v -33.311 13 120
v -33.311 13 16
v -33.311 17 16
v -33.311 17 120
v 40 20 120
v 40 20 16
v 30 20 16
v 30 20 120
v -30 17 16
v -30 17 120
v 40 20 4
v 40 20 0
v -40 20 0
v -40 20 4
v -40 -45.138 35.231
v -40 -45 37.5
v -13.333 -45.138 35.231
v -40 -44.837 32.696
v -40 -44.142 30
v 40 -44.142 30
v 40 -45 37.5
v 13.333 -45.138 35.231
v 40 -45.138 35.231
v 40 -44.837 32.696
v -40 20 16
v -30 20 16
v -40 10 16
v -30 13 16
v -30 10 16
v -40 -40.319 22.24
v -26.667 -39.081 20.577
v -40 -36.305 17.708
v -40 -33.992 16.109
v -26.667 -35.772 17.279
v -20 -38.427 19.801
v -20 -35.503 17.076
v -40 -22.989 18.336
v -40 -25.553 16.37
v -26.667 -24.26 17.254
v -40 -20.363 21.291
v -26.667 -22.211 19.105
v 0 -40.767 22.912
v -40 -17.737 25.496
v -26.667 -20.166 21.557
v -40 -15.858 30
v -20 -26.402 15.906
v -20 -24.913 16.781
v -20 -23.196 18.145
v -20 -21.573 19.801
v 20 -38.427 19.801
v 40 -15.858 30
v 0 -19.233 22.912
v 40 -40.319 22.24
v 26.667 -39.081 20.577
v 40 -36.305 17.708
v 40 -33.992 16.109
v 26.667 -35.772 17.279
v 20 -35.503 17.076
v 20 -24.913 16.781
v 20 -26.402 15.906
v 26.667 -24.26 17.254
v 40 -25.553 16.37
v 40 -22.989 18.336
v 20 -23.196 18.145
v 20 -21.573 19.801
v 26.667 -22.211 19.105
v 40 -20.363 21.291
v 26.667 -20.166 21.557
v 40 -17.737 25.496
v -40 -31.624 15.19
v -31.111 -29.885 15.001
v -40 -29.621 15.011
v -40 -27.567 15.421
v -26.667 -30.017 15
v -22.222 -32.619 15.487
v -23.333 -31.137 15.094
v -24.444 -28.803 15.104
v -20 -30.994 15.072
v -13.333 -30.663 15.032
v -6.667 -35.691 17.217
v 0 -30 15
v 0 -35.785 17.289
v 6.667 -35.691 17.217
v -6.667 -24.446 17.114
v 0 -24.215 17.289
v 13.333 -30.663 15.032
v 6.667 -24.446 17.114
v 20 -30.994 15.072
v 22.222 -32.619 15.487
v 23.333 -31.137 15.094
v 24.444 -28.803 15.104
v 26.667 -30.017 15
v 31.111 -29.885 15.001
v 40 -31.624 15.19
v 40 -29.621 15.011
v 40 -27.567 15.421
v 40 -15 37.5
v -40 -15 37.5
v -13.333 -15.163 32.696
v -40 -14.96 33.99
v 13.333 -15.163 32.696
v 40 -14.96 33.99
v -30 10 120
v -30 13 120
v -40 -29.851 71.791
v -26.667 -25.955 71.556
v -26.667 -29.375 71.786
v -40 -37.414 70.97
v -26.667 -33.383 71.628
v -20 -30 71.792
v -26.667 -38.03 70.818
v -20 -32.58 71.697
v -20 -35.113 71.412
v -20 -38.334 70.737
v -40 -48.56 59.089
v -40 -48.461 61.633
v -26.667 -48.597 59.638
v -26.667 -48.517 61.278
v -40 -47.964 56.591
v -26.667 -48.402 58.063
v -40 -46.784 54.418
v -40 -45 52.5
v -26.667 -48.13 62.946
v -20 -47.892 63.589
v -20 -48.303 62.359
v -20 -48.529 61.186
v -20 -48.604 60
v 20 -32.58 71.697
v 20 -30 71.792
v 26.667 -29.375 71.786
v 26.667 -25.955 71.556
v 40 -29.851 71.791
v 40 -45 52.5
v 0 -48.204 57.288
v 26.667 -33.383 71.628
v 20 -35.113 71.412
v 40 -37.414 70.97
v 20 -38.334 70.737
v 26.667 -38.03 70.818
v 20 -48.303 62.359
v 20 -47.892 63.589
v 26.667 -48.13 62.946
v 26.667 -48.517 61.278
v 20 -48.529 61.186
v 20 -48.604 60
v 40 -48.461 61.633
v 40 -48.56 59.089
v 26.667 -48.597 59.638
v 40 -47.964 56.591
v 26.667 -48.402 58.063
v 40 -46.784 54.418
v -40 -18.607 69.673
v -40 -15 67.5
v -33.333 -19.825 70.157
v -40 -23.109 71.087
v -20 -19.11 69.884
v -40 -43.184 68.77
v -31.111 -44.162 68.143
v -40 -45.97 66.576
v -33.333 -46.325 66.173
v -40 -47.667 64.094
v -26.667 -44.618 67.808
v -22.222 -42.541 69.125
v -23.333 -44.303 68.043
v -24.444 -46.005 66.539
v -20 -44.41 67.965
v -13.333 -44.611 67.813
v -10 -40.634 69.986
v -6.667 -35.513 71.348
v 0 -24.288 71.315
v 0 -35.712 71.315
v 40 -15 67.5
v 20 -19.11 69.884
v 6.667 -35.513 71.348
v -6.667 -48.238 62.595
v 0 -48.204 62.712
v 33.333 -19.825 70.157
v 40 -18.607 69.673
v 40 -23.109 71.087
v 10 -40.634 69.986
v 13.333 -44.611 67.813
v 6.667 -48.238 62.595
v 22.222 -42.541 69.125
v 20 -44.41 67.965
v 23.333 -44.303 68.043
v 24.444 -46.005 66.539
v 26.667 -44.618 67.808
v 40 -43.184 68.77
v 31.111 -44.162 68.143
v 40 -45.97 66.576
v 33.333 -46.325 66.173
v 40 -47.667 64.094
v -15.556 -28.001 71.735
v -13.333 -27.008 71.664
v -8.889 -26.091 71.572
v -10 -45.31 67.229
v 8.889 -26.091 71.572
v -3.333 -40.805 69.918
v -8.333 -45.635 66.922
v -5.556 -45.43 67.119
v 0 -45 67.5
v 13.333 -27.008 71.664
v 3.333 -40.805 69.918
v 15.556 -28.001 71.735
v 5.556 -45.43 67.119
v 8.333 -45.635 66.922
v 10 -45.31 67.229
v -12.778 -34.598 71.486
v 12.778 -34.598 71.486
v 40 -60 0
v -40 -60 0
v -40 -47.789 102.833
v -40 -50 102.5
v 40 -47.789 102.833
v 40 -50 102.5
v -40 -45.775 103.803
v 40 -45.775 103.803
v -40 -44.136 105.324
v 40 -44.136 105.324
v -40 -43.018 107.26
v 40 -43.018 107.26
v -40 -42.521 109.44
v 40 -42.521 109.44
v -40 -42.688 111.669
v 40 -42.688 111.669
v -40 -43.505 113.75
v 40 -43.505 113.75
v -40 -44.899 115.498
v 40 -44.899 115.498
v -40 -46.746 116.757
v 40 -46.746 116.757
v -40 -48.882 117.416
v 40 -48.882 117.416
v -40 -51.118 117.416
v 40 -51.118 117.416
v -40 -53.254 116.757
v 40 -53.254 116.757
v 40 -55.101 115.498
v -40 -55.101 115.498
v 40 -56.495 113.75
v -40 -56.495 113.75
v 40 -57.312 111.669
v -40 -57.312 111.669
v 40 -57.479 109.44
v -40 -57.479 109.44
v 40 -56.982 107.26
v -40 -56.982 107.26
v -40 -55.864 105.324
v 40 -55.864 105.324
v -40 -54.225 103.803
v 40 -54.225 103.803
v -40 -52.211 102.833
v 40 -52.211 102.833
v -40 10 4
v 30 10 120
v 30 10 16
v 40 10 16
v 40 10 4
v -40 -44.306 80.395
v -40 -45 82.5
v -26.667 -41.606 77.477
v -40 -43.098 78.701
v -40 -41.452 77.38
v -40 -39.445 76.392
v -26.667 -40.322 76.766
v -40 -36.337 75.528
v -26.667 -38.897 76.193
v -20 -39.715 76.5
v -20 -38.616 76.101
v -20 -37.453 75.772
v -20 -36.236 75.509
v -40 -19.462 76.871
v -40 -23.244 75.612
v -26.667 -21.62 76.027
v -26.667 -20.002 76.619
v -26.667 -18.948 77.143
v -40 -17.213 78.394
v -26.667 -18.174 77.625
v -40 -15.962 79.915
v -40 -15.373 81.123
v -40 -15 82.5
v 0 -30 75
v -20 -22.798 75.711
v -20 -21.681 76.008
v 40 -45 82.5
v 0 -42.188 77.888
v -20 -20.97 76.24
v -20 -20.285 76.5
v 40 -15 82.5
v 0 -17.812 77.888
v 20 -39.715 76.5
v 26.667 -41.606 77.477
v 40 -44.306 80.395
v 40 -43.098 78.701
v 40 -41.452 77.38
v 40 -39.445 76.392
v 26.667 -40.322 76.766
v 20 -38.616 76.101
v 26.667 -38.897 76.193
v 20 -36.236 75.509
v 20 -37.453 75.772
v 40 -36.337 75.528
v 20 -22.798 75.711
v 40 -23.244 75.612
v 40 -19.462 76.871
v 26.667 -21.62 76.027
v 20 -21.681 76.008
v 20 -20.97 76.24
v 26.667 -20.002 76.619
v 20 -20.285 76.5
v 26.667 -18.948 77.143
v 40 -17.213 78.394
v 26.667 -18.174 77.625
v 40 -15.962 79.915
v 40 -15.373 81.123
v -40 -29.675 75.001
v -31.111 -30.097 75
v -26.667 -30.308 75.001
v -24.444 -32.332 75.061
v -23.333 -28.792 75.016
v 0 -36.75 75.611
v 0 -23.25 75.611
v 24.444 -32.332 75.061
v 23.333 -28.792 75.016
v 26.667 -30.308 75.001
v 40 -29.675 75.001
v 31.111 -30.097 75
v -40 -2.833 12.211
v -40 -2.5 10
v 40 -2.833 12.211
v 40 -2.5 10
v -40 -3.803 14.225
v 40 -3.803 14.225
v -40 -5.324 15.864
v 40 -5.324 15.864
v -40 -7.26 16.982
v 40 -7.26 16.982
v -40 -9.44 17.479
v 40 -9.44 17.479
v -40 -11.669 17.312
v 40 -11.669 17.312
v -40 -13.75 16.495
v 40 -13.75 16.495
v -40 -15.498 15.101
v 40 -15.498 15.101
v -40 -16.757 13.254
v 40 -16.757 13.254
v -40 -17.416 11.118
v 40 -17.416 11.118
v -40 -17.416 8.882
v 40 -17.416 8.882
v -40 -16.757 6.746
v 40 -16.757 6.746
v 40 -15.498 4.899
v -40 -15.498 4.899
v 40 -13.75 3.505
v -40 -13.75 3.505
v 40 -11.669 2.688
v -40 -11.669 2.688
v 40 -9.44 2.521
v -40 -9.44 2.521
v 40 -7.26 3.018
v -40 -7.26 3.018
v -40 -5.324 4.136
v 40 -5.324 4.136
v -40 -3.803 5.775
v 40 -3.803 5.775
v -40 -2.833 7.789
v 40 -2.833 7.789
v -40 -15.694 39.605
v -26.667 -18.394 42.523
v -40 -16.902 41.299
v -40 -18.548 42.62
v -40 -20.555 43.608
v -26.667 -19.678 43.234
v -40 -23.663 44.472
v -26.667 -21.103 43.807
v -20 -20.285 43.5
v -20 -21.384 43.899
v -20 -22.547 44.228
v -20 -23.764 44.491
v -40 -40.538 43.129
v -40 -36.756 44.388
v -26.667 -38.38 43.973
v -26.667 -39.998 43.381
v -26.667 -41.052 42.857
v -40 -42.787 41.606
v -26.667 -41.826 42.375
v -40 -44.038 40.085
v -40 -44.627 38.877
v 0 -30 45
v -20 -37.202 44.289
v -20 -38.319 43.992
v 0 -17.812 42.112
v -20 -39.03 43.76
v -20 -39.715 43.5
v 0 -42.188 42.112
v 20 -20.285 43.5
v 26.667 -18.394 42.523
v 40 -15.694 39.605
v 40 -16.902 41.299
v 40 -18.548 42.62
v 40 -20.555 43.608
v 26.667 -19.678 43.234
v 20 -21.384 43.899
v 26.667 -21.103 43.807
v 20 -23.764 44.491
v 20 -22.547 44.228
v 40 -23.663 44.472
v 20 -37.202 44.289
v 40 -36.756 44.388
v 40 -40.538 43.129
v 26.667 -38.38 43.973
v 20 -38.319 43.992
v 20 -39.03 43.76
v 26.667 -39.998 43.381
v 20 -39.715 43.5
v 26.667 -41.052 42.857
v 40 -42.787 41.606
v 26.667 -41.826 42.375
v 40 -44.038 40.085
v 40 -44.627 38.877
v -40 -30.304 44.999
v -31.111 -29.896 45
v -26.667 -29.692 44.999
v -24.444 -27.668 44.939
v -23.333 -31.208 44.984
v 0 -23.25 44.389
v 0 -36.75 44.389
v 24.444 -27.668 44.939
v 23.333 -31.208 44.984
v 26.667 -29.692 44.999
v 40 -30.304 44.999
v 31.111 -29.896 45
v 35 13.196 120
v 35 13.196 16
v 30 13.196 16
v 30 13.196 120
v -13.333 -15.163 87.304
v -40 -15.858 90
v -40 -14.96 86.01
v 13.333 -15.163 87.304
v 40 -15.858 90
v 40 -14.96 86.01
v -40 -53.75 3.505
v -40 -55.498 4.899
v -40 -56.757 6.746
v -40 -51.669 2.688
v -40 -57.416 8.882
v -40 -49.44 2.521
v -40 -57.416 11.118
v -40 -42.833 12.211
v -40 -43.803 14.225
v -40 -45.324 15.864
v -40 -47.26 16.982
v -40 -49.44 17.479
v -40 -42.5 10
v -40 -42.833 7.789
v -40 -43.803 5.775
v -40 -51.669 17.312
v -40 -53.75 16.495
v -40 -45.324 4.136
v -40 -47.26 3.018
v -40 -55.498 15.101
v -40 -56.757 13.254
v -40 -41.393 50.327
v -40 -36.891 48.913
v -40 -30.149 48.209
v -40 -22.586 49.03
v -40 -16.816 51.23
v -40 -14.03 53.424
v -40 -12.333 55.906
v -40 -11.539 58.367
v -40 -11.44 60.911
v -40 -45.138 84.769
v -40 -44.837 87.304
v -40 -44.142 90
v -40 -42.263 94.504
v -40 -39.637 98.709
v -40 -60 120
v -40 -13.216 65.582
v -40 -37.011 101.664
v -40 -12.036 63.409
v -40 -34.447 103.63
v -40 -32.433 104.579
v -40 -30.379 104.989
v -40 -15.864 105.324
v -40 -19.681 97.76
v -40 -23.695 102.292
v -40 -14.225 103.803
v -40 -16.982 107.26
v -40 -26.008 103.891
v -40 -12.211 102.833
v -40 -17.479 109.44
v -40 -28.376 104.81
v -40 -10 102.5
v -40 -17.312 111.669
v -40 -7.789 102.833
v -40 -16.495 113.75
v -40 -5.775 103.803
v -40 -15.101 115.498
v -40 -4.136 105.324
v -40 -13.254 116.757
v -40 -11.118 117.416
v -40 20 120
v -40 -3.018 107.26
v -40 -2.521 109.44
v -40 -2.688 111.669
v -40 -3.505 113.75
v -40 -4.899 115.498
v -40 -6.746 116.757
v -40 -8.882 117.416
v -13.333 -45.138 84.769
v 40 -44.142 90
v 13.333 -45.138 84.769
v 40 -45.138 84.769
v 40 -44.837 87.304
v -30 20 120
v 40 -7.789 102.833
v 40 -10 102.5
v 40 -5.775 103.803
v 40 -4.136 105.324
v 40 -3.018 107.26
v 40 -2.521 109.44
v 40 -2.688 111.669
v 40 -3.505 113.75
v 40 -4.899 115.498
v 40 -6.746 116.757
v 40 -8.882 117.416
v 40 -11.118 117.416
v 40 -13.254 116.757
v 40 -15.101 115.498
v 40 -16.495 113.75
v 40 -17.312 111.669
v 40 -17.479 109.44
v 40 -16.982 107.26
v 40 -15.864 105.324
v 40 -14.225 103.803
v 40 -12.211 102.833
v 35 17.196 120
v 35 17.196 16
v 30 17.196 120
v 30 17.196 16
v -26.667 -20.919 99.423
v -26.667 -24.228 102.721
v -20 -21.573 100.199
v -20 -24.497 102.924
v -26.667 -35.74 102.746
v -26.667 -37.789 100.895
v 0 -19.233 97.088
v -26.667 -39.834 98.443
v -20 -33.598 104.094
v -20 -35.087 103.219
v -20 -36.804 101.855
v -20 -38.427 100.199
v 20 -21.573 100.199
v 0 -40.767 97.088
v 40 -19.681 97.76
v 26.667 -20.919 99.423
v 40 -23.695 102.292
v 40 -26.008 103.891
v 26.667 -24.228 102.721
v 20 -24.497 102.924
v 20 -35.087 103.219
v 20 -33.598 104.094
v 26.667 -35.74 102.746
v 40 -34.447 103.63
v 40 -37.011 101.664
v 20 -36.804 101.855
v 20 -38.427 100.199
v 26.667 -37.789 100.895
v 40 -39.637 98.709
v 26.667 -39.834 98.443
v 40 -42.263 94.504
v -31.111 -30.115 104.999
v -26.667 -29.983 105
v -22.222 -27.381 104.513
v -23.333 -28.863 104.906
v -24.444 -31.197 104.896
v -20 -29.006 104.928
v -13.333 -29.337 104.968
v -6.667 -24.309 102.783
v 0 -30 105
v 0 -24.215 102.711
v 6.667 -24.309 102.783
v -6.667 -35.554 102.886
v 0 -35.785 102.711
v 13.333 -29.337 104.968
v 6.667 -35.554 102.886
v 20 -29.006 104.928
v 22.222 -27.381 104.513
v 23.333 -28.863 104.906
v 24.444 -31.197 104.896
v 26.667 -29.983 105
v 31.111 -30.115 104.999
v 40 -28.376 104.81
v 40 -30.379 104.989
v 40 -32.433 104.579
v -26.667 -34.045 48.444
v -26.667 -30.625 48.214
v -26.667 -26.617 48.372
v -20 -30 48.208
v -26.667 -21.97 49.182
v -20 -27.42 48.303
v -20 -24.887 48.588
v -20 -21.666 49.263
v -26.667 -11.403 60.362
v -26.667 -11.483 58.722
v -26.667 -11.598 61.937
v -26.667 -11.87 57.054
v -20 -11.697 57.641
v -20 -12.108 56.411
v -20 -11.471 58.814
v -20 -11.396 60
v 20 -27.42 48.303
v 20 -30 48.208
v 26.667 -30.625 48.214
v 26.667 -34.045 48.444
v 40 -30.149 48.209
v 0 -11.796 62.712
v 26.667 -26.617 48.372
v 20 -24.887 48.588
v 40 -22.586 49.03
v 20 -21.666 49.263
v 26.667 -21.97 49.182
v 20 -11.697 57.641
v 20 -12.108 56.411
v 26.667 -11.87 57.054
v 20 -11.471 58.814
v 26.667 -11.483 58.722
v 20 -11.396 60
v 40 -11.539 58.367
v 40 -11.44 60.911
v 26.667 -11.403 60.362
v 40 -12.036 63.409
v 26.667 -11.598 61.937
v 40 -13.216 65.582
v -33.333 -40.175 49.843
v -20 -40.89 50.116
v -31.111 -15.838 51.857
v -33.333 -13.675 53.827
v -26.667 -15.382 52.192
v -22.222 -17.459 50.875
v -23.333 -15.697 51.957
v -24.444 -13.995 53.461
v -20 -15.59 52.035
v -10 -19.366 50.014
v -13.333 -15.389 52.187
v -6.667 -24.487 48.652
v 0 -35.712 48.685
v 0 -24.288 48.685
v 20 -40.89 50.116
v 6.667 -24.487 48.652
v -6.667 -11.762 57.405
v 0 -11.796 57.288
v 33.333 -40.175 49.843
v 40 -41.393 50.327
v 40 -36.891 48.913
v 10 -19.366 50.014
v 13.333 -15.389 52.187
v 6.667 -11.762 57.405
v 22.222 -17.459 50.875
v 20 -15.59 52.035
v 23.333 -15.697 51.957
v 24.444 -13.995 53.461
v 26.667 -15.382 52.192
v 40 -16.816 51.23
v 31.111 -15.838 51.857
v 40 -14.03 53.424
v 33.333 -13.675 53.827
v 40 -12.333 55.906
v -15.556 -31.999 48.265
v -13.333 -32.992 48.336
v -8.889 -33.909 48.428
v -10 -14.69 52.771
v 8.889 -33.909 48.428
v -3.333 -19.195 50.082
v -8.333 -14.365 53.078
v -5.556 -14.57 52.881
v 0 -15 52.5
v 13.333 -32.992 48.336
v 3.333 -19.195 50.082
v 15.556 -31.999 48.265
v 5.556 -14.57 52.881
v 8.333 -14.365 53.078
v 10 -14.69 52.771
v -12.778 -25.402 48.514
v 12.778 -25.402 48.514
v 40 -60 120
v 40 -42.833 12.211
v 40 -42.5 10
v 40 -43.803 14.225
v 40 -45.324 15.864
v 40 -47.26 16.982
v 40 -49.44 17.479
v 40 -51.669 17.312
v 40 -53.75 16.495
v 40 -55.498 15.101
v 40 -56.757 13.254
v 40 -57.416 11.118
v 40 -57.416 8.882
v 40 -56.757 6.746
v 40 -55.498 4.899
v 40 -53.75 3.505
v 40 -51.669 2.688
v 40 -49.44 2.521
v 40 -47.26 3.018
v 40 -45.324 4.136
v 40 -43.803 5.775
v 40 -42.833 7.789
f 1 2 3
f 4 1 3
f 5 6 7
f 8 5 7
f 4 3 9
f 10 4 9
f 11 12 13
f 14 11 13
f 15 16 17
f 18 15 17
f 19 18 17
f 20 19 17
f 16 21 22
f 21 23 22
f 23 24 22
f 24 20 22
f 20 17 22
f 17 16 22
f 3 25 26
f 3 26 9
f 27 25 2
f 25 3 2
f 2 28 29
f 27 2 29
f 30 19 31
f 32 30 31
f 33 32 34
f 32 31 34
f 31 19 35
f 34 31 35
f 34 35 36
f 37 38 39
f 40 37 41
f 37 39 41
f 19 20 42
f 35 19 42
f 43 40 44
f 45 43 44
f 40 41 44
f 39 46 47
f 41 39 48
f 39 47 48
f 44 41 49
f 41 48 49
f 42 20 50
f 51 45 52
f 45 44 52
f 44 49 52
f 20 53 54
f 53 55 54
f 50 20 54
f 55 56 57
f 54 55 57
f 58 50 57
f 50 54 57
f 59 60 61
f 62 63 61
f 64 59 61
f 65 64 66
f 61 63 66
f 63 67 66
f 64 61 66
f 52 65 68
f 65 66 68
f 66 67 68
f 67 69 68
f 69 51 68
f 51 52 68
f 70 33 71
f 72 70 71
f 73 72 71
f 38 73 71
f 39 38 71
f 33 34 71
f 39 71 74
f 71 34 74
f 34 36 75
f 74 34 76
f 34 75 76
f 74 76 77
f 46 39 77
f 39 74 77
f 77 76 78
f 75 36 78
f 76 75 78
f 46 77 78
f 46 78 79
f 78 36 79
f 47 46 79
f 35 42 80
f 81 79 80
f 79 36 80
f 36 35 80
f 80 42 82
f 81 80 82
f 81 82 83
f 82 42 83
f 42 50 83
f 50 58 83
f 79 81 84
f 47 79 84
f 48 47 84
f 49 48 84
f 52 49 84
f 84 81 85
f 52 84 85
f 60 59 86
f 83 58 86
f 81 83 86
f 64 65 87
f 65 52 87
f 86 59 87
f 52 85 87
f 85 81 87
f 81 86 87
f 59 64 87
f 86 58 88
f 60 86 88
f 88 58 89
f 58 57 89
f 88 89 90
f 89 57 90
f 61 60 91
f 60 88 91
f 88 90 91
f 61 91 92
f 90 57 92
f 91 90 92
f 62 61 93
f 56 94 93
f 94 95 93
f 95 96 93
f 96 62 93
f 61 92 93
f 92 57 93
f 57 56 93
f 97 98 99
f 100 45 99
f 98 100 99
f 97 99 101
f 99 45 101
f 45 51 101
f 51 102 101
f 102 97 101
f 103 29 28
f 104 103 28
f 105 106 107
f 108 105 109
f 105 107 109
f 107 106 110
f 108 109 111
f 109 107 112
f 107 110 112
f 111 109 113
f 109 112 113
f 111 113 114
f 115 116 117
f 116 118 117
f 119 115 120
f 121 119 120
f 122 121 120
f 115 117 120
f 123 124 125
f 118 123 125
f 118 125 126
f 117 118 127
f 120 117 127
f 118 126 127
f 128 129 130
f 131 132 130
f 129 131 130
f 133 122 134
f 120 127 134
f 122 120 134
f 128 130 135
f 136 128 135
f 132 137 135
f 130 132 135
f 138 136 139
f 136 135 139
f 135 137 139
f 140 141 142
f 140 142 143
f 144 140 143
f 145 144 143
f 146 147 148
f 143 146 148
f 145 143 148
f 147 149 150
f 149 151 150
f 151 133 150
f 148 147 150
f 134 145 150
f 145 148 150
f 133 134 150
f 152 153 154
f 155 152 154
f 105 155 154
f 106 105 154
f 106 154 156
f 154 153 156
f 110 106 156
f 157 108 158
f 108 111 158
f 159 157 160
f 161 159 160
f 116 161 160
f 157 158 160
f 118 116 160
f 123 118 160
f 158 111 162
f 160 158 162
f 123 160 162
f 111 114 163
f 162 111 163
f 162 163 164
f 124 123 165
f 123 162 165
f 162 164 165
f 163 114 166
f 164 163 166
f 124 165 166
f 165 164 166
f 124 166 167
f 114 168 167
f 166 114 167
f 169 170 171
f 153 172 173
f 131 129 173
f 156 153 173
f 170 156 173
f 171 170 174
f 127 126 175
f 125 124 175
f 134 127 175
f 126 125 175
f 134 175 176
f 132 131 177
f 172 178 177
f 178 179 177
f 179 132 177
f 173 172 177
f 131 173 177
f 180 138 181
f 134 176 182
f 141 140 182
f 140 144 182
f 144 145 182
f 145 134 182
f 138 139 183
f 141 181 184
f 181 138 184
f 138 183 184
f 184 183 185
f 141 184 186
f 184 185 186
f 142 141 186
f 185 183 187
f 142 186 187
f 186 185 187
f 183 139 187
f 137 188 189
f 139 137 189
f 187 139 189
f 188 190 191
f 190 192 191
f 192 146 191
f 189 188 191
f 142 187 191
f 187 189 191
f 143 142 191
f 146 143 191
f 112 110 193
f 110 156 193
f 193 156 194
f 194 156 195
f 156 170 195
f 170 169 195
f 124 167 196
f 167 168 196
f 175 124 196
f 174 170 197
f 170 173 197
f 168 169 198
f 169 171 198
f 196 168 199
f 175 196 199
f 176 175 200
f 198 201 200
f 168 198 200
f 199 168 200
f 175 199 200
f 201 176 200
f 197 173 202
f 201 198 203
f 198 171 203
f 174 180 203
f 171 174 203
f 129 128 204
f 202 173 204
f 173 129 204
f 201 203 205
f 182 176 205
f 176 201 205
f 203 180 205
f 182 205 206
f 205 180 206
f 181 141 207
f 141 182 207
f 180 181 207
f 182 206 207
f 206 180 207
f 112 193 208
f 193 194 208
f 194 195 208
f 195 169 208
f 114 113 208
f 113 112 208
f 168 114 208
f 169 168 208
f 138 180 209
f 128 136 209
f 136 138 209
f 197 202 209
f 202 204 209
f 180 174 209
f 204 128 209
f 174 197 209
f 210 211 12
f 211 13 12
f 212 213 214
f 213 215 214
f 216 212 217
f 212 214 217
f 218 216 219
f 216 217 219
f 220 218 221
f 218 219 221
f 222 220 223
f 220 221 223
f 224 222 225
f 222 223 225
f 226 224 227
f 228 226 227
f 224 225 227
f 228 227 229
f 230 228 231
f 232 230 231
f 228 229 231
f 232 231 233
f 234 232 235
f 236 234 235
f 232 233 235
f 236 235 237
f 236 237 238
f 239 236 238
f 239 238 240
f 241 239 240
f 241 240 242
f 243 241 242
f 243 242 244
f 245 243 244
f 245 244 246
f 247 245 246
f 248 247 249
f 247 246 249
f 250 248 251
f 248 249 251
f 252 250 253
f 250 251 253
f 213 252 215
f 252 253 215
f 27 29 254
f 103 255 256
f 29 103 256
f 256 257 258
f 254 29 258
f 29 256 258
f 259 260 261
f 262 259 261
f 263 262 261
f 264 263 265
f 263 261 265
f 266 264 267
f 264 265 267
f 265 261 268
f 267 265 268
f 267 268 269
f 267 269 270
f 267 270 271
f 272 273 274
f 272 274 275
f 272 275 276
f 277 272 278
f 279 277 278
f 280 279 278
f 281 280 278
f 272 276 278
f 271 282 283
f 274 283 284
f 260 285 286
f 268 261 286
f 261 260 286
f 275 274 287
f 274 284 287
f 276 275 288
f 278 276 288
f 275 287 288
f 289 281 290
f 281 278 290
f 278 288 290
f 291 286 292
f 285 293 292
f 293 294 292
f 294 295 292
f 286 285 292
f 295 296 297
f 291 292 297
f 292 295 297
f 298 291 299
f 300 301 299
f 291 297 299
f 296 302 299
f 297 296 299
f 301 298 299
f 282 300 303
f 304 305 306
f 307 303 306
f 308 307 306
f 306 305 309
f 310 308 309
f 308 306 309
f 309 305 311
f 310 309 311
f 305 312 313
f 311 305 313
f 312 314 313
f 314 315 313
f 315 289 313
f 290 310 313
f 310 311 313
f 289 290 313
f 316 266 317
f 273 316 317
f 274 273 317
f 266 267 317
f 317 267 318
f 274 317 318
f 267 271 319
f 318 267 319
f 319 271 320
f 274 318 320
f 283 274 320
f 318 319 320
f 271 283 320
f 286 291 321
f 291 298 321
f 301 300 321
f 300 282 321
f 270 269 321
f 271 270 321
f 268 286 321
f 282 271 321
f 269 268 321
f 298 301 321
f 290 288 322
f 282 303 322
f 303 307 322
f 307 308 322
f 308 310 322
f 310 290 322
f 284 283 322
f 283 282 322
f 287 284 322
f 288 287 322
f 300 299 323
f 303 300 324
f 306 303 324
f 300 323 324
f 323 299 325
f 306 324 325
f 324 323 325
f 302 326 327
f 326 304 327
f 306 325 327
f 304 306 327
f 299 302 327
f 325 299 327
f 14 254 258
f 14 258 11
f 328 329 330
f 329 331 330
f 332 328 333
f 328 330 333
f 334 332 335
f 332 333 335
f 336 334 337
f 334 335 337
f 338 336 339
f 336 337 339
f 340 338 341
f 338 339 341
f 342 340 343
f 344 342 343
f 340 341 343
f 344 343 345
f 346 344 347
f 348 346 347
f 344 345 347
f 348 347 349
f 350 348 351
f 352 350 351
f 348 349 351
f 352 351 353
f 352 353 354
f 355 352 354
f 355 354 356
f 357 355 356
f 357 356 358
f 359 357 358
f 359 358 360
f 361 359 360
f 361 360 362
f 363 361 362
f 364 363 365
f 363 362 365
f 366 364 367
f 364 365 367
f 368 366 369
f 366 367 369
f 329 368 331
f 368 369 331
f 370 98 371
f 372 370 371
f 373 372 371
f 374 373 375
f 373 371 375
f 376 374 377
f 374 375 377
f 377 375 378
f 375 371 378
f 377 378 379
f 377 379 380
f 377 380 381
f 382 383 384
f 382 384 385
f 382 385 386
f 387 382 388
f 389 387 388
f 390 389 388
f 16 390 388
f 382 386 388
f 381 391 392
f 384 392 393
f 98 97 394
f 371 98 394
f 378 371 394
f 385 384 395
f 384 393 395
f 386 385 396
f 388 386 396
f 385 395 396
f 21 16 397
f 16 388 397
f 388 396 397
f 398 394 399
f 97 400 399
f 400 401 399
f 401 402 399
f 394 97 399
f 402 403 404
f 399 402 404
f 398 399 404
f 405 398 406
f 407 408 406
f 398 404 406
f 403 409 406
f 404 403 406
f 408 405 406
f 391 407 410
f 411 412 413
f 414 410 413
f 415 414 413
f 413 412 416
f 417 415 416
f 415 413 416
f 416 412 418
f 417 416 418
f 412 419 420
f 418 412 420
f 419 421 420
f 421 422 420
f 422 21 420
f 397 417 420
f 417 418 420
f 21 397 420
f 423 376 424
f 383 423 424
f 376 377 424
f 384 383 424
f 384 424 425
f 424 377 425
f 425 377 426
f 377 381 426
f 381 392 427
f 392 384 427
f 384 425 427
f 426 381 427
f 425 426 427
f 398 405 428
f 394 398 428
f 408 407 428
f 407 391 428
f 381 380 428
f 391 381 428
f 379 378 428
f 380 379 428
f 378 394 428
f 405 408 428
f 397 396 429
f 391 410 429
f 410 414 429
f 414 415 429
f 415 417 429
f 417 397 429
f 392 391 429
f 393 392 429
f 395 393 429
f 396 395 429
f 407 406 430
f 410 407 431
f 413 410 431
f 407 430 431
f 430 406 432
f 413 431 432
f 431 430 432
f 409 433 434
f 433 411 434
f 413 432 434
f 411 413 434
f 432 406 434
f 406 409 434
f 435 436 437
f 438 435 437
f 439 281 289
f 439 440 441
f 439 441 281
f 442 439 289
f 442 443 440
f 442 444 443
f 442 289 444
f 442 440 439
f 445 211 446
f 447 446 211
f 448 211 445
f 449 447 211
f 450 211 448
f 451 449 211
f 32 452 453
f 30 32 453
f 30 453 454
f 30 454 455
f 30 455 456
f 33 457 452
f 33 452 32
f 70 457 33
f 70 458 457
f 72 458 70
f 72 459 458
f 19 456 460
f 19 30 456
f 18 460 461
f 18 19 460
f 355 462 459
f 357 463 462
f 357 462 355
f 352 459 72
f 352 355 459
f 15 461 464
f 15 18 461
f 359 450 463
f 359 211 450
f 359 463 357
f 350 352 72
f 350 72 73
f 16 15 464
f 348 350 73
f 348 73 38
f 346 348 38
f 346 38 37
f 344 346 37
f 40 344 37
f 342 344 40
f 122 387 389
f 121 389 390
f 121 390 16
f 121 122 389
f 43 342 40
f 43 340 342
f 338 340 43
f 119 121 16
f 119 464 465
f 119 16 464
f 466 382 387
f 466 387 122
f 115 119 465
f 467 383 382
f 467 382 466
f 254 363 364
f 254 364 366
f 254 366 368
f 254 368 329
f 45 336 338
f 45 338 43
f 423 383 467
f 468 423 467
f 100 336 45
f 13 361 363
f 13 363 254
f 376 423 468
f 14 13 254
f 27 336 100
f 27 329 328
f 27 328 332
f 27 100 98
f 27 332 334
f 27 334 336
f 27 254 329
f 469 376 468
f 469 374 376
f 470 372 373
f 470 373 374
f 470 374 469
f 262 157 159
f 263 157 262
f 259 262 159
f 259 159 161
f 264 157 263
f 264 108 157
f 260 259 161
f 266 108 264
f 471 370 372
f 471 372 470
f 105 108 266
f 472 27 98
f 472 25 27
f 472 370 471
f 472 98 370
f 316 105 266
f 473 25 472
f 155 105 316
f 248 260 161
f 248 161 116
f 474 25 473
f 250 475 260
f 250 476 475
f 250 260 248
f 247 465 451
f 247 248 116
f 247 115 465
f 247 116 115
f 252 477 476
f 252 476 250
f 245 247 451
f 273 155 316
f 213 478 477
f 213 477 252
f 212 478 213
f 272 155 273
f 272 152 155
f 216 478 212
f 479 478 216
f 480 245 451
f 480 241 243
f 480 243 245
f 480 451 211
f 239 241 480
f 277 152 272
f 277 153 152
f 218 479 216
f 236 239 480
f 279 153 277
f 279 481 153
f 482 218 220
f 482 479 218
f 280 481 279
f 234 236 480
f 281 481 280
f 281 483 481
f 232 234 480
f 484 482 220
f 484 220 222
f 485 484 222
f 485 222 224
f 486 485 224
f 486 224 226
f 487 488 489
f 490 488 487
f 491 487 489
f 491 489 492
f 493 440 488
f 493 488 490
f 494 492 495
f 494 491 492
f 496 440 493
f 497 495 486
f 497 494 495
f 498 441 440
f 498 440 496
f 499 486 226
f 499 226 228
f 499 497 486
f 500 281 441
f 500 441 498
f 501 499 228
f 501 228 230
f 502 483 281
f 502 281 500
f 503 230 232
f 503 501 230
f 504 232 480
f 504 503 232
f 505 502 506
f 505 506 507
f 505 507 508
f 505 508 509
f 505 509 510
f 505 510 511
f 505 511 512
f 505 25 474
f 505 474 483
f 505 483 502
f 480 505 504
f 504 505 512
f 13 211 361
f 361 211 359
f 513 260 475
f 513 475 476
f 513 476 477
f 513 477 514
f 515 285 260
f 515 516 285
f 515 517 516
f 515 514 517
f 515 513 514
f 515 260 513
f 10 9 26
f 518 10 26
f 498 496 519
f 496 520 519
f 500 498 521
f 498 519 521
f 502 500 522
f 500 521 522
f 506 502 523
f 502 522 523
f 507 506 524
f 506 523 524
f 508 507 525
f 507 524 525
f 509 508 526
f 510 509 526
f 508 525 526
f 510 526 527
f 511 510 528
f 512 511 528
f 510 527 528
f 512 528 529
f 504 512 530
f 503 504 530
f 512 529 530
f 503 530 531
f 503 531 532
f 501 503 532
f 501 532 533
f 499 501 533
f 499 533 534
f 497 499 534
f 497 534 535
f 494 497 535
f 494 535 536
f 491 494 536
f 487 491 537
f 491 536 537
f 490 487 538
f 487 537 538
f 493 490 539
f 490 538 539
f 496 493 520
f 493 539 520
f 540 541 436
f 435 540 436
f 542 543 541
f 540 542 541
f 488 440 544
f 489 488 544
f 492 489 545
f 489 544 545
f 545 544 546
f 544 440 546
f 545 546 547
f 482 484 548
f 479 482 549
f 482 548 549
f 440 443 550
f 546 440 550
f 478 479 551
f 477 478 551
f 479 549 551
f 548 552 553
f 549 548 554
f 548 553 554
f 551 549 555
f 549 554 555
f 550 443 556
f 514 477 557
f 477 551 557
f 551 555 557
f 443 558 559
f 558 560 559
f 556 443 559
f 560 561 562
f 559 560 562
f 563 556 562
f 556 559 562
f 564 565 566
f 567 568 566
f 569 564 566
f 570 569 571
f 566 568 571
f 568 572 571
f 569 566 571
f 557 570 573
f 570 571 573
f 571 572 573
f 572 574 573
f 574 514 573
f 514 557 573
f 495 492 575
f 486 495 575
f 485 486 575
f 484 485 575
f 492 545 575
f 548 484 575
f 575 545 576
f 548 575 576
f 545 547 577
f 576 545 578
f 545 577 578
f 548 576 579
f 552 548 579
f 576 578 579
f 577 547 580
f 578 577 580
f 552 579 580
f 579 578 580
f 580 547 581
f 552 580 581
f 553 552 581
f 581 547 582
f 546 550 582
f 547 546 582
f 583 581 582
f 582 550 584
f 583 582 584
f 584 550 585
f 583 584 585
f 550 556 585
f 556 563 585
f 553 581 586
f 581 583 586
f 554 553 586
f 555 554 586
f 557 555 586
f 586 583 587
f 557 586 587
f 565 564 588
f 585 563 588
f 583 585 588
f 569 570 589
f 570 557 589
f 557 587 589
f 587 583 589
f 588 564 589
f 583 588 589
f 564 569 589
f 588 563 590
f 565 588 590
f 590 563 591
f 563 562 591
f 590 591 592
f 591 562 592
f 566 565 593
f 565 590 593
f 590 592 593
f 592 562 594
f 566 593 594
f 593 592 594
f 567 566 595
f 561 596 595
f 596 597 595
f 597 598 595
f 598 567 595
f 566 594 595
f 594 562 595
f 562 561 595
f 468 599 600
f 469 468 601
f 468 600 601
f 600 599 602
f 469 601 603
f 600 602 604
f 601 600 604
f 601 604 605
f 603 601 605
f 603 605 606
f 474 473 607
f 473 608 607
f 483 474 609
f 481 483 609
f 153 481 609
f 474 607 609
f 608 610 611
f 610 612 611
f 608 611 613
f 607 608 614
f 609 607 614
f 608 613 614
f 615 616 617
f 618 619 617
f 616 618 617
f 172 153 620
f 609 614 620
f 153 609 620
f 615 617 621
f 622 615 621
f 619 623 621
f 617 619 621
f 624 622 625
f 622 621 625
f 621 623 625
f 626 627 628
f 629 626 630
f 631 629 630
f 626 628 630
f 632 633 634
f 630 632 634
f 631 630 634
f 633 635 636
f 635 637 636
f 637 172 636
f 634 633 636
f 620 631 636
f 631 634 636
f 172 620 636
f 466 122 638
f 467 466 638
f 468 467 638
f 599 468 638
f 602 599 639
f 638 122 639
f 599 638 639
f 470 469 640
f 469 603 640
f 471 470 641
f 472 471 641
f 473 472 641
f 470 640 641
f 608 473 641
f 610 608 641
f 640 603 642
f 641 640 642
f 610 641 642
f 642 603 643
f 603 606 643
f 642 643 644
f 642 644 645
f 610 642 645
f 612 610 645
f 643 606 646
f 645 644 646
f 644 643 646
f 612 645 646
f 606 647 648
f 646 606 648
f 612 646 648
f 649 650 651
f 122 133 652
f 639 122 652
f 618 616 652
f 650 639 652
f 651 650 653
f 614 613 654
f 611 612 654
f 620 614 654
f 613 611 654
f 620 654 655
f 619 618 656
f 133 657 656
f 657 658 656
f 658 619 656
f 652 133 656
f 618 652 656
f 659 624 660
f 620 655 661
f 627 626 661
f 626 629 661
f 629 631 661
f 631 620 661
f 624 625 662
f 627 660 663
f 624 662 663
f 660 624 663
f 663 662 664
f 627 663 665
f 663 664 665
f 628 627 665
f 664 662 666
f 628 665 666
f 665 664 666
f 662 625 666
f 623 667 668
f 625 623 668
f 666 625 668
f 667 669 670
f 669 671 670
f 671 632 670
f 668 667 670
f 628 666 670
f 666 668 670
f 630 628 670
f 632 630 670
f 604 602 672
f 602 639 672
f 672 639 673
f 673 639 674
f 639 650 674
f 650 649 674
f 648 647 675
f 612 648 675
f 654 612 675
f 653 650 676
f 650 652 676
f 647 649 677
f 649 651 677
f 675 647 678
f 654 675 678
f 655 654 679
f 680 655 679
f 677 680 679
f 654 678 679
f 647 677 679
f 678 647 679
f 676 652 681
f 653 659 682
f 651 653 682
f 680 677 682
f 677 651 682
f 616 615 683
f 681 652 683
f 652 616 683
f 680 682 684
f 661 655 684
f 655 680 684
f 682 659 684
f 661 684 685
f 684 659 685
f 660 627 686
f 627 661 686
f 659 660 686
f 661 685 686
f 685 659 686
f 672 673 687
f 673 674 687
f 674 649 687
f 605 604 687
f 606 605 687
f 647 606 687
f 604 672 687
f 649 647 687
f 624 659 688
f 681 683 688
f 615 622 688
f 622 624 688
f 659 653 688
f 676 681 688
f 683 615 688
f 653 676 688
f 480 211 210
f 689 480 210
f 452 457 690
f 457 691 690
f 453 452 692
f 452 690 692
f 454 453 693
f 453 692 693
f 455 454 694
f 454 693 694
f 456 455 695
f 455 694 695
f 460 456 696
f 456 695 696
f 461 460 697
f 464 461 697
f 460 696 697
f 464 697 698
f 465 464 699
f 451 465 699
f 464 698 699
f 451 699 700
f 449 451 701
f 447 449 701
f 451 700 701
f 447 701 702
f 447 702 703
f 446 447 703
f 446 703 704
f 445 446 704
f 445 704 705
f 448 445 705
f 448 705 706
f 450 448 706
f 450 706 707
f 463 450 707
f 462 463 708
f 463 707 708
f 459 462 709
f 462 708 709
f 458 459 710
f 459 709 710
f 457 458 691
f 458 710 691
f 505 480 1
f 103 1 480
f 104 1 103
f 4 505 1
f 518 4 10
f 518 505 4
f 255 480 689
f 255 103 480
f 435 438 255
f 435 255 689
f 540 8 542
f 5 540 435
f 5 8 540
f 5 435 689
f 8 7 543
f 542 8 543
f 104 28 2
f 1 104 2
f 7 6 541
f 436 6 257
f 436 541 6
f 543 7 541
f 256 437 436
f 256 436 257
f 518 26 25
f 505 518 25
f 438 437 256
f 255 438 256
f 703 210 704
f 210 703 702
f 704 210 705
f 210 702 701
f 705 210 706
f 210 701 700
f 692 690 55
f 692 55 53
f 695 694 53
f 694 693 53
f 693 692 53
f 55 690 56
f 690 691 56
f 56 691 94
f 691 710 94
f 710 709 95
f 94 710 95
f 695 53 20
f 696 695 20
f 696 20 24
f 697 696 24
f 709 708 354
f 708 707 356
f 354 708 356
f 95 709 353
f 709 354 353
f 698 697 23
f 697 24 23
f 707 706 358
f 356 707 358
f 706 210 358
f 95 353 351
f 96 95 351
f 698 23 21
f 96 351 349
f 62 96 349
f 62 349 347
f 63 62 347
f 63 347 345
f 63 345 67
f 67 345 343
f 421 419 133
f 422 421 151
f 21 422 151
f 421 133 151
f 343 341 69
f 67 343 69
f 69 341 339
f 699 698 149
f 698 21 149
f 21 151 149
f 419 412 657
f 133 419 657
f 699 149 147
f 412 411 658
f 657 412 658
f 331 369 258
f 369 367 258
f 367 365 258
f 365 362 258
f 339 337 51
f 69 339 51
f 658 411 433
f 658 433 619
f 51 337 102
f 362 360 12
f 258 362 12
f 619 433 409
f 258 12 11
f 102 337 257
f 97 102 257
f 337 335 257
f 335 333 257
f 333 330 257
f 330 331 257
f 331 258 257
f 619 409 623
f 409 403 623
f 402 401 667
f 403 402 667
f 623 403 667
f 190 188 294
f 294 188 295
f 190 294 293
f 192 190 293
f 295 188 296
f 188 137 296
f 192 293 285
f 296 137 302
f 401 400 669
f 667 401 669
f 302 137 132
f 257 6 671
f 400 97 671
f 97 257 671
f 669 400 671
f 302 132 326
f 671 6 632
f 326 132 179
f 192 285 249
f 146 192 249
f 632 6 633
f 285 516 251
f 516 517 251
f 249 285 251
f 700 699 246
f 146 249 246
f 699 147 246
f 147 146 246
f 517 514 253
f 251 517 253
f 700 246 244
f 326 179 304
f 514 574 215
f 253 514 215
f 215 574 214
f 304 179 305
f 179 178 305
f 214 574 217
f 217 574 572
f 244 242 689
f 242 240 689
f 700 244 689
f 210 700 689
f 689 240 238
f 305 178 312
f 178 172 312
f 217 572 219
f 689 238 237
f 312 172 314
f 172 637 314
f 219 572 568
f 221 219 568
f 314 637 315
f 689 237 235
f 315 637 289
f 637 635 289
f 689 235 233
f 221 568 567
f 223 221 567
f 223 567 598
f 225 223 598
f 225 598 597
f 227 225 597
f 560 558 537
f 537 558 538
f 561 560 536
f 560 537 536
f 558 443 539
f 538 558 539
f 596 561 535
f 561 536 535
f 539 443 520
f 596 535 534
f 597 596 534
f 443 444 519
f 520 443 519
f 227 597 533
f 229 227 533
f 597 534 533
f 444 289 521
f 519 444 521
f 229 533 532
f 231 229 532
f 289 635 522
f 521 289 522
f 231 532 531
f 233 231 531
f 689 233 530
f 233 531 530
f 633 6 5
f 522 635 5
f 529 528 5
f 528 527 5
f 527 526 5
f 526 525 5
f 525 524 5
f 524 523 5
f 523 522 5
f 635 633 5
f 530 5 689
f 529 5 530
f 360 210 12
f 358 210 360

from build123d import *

# Parameters (mm, degrees)
F0_W          = 25
F0_H          = 10
F1_DEPTH      = 120
F0_W_2        = 3.3108529449
F0_H_2        = 4
F0_W_3        = 5
F2_DEPTH      = 4
F4_DEPTH      = 100
F4_DEPTH_BACK = 100
F6_DEPTH      = 120
F7_DEPTH      = 40
F9_DEPTH      = 100
F9_DEPTH_BACK = 100
F12_DEPTH     = 80


with BuildPart() as f1:
    # F0 (on Top) → F1 (new body)
    with BuildSketch(Plane.XY):
        with BuildLine():
            ThreePointArc((-40, 20), (-57.0710678119, 27.0710678119), (-50, 10))
            Line((-50, 10), (-50, 20))
            Line((-50, 20), (-40, 20))
        make_face()
        with BuildLine():
            Line((-50, 20), (-50, 10))
            ThreePointArc((-50, 10), (-42.9289321881, 12.9289321881), (-40, 20))
            Line((-40, 20), (-50, 20))
        make_face()
        with BuildLine():
            Line((-25, 0), (-25, 10))
            Line((-25, 10), (-30, 10))
            Line((-30, 10), (-30, 13))
            Line((-30, 13), (-33.3108529449, 13))
            Line((-33.3108529449, 13), (-33.3108529449, 17))
            Line((-33.3108529449, 17), (-30, 17))
            Line((-30, 17), (-30, 20))
            Line((-30, 20), (-40, 20))
            ThreePointArc((-40, 20), (-42.9289321881, 12.9289321881), (-50, 10))
            ThreePointArc((-50, 10), (-42.9289321881, 7.0710678119), (-40, 0))
            Line((-40, 0), (-25, 0))
        make_face()
        with Locations((-12.5, 5)):
            Rectangle(F0_W, F0_H)
        with Locations((12.5, 5)):
            Rectangle(F0_W, F0_H)
        with BuildLine():
            Line((25, 0), (0, 0))
            add(Edge.make_bspline(
                [(0, 0), (8.3333333333, 0), (16.6666666667, -3.90625), (25, -9.27734375)],
                knots=[0.5, 0.5, 0.5, 0.5, 0.8125, 0.8125, 0.8125, 0.8125], degree=3))
            Line((25, -9.27734375), (25, 0))
        make_face()
        with BuildLine():
            Line((0, 0), (-25, 0))
            Line((-25, 0), (-25, -9.27734375))
            add(Edge.make_bspline(
                [(-25, -9.27734375), (-16.6666666667, -3.90625), (-8.3333333333, 0), (0, 0)],
                knots=[0.1875, 0.1875, 0.1875, 0.1875, 0.5, 0.5, 0.5, 0.5], degree=3))
        make_face()
        with BuildLine():
            Line((-25, -9.27734375), (-25, 0))
            Line((-25, 0), (-40, 0))
            ThreePointArc((-40, 0), (-42.9289321881, -7.0710678119), (-50, -10))
            ThreePointArc((-50, -10), (-42.9289321881, -12.9289321881), (-40, -20))
            add(Edge.make_bspline(
                [(-40, -20), (-35, -16.25), (-30, -12.5), (-25, -9.27734375)],
                knots=[0, 0, 0, 0, 0.1875, 0.1875, 0.1875, 0.1875], degree=3))
        make_face()
        with BuildLine():
            Line((-50, -20), (-40, -20))
            ThreePointArc((-40, -20), (-42.9289321881, -12.9289321881), (-50, -10))
            Line((-50, -10), (-50, -20))
        make_face()
        with BuildLine():
            ThreePointArc((-50, -10), (-57.0710678119, -27.0710678119), (-40, -20))
            Line((-40, -20), (-50, -20))
            Line((-50, -20), (-50, -10))
        make_face()
        with BuildLine():
            Line((30, 10), (25, 10))
            Line((25, 10), (25, 0))
            Line((25, 0), (40, 0))
            ThreePointArc((40, 0), (42.9289321881, 7.0710678119), (50, 10))
            ThreePointArc((50, 10), (42.9289321881, 12.9289321881), (40, 20))
            Line((40, 20), (30, 20))
            Line((30, 20), (30, 17.1959070936))
            Line((30, 17.1959070936), (35, 17.1959070936))
            Line((35, 17.1959070936), (35, 13.1959070936))
            Line((35, 13.1959070936), (30, 13.1959070936))
            Line((30, 13.1959070936), (30, 10))
        make_face()
        with BuildLine():
            Line((50, 20), (40, 20))
            ThreePointArc((40, 20), (42.9289321881, 12.9289321881), (50, 10))
            Line((50, 10), (50, 20))
        make_face()
        with BuildLine():
            ThreePointArc((60, 20), (50, 30), (40, 20))
            Line((40, 20), (50, 20))
            Line((50, 20), (50, 10))
            ThreePointArc((50, 10), (57.0710678119, 12.9289321881), (60, 20))
        make_face()
        with BuildLine():
            Line((40, 0), (25, 0))
            Line((25, 0), (25, -9.27734375))
            add(Edge.make_bspline(
                [(25, -9.27734375), (30, -12.5), (35, -16.25), (40, -20)],
                knots=[0.8125, 0.8125, 0.8125, 0.8125, 1, 1, 1, 1], degree=3))
            ThreePointArc((40, -20), (42.9289321881, -12.9289321881), (50, -10))
            ThreePointArc((50, -10), (42.9289321881, -7.0710678119), (40, 0))
        make_face()
        with BuildLine():
            ThreePointArc((50, -10), (42.9289321881, -12.9289321881), (40, -20))
            Line((40, -20), (50, -20))
            Line((50, -20), (50, -10))
        make_face()
        with BuildLine():
            Line((50, -20), (40, -20))
            ThreePointArc((40, -20), (50, -30), (60, -20))
            ThreePointArc((60, -20), (57.0710678119, -12.9289321881), (50, -10))
            Line((50, -10), (50, -20))
        make_face()
        with BuildLine():
            Line((25, -10), (0, -10))
            Line((0, -10), (0, -20))
            Line((0, -20), (40, -20))
            add(Edge.make_bspline(
                [(25, -9.27734375), (30, -12.5), (35, -16.25), (40, -20)],
                knots=[0.8125, 0.8125, 0.8125, 0.8125, 1, 1, 1, 1], degree=3))
            Line((25, -9.27734375), (25, -10))
        make_face()
        with BuildLine():
            Line((-25, -10), (-25, -9.27734375))
            add(Edge.make_bspline(
                [(-40, -20), (-35, -16.25), (-30, -12.5), (-25, -9.27734375)],
                knots=[0, 0, 0, 0, 0.1875, 0.1875, 0.1875, 0.1875], degree=3))
            Line((-40, -20), (0, -20))
            Line((0, -20), (0, -10))
            Line((0, -10), (-25, -10))
        make_face()
        with BuildLine():
            Line((0, -10), (0, 0))
            add(Edge.make_bspline(
                [(-25, -9.27734375), (-16.6666666667, -3.90625), (-8.3333333333, 0), (0, 0)],
                knots=[0.1875, 0.1875, 0.1875, 0.1875, 0.5, 0.5, 0.5, 0.5], degree=3))
            Line((-25, -9.27734375), (-25, -10))
            Line((-25, -10), (0, -10))
        make_face()
        with BuildLine():
            add(Edge.make_bspline(
                [(0, 0), (8.3333333333, 0), (16.6666666667, -3.90625), (25, -9.27734375)],
                knots=[0.5, 0.5, 0.5, 0.5, 0.8125, 0.8125, 0.8125, 0.8125], degree=3))
            Line((0, 0), (0, -10))
            Line((0, -10), (25, -10))
            Line((25, -10), (25, -9.27734375))
        make_face()
    extrude(amount=F1_DEPTH)

    # F0 (on Top) → F2 (join)
    with BuildSketch(Plane.XY):
        Polygon((-30, 10), (-25, 10), (0, 10), (0, 20), (-30, 20), (-30, 17), (-26.6891470551, 17), (-26.6891470551, 13), (-30, 13), align=None)
        with Locations((-28.3445735276, 15)):
            Rectangle(F0_W_2, F0_H_2)
        with Locations((-31.6554264724, 15)):
            Rectangle(F0_W_2, F0_H_2)
        with Locations((32.5, 15.1959070936)):
            Rectangle(F0_W_3, F0_H_2)
        with Locations((27.5, 15.1959070936)):
            Rectangle(F0_W_3, F0_H_2)
        Polygon((0, 20), (0, 10), (25, 10), (30, 10), (30, 13.1959070936), (25, 13.1959070936), (25, 17.1959070936), (30, 17.1959070936), (30, 20), align=None)
    extrude(amount=F2_DEPTH)

    # F3 (on Right) → F4 (cut, two sides)
    with BuildSketch(Plane.YZ) as f4_sk:
        Polygon((30, 16), (20, 16), (10, 16), (10, 4), (15, 4), (20, 4), (30, 4), align=None)
    extrude(amount=F4_DEPTH, mode=Mode.SUBTRACT)
    extrude(f4_sk.sketch, amount=-F4_DEPTH_BACK, mode=Mode.SUBTRACT)

    # F5 (on Top) → F6 (cut)
    with BuildSketch(Plane.XY):
        Polygon((-40, -41.7266488075), (-40, 0), (-40, 41.7266488075), (-60, 41.7266488075), (-60, -41.7266488075), align=None)
        Polygon((40, 36.4203676581), (40, 0), (40, -36.4203676581), (60, -36.4203676581), (60, 36.4203676581), align=None)
    extrude(amount=F6_DEPTH, mode=Mode.SUBTRACT)

    # F7 (add): a face of the model
    f7_faces = [f1.faces().sort_by_distance(p)[0] for p in [
        (0, -20, 60),
    ]]
    extrude(f7_faces, amount=F7_DEPTH)

    # F8 (on Right) → F9 (cut, two sides)
    with BuildSketch(Plane.YZ) as f9_sk:
        with BuildLine():
            ThreePointArc((-42.5, 110), (-55.3033008589, 115.3033008589), (-50, 102.5))
            ThreePointArc((-50, 102.5), (-44.6966991411, 104.6966991411), (-42.5, 110))
        make_face()
        with BuildLine():
            ThreePointArc((-50, 17.5), (-55.3033008589, 4.6966991411), (-42.5, 10))
            ThreePointArc((-42.5, 10), (-44.6966991411, 15.3033008589), (-50, 17.5))
        make_face()
        with BuildLine():
            ThreePointArc((-2.5, 110), (-15.3033008589, 115.3033008589), (-10, 102.5))
            ThreePointArc((-10, 102.5), (-4.6966991411, 104.6966991411), (-2.5, 110))
        make_face()
        with BuildLine():
            ThreePointArc((-10, 17.5), (-15.3033008589, 15.3033008589), (-17.5, 10))
            ThreePointArc((-17.5, 10), (-10, 2.5), (-2.5, 10))
            ThreePointArc((-2.5, 10), (-4.6966991411, 15.3033008589), (-10, 17.5))
        make_face()
    extrude(amount=F9_DEPTH, mode=Mode.SUBTRACT)
    extrude(f9_sk.sketch, amount=-F9_DEPTH_BACK, mode=Mode.SUBTRACT)

    # F11 (on offset) → F12 (cut)
    with BuildSketch(Plane.YZ.offset(40)):
        with BuildLine():
            Line((-44.1418695118, 90), (-30, 90))
            Line((-30, 90), (-30, 105))
            add(Edge.make_bspline(
                [(-44.1418695118, 90), (-41.838466476, 97.1981606606), (-35.919233238, 105), (-30, 105)],
                knots=[0.0771731373, 0.0771731373, 0.0771731373, 0.0771731373, 0.2797185487, 0.2797185487, 0.2797185487, 0.2797185487], degree=3))
        make_face()
        with BuildLine():
            Line((-45, 82.5), (-30, 90))
            Line((-30, 90), (-44.1418695118, 90))
            add(Edge.make_bspline(
                [(-45, 82.5), (-45.3722155878, 84.6024026705), (-45.0195040015, 87.2573822471), (-44.1418695118, 90)],
                knots=[0, 0, 0, 0, 0.0771731373, 0.0771731373, 0.0771731373, 0.0771731373], degree=3))
        make_face()
        with BuildLine():
            add(Edge.make_bspline(
                [(-30, 75), (-36.9687776553, 75), (-43.9375553106, 76.4989440916), (-45, 82.5)],
                knots=[0.7797185487, 0.7797185487, 0.7797185487, 0.7797185487, 1, 1, 1, 1], degree=3))
            Line((-30, 75), (-30, 90))
            Line((-30, 90), (-45, 82.5))
        make_face()
        with BuildLine():
            Line((-30, 90), (-30, 75))
            add(Edge.make_bspline(
                [(-15, 82.5), (-16.0624446894, 76.4989440916), (-23.0312223447, 75), (-30, 75)],
                knots=[0.5594370973, 0.5594370973, 0.5594370973, 0.5594370973, 0.7797185487, 0.7797185487, 0.7797185487, 0.7797185487], degree=3))
            Line((-15, 82.5), (-30, 90))
        make_face()
        with BuildLine():
            Line((-30, 90), (-15, 82.5))
            add(Edge.make_bspline(
                [(-15.8581304882, 90), (-14.9804959985, 87.2573822471), (-14.6277844122, 84.6024026705), (-15, 82.5)],
                knots=[0.48226396, 0.48226396, 0.48226396, 0.48226396, 0.5594370973, 0.5594370973, 0.5594370973, 0.5594370973], degree=3))
            Line((-15.8581304882, 90), (-30, 90))
        make_face()
        with BuildLine():
            Line((-30, 90), (-15.8581304882, 90))
            add(Edge.make_bspline(
                [(-30, 105), (-24.080766762, 105), (-18.161533524, 97.1981606606), (-15.8581304882, 90)],
                knots=[0.2797185487, 0.2797185487, 0.2797185487, 0.2797185487, 0.48226396, 0.48226396, 0.48226396, 0.48226396], degree=3))
            Line((-30, 105), (-30, 90))
        make_face()
        with BuildLine():
            Line((-30, 71.7917303212), (-30, 60))
            Line((-30, 60), (-15, 67.5))
            add(Edge.make_bspline(
                [(-15, 67.5), (-18.3981137949, 70.3611535475), (-24.1990568975, 71.7917303212), (-30, 71.7917303212)],
                knots=[0.2071067812, 0.2071067812, 0.2071067812, 0.2071067812, 0.3535533906, 0.3535533906, 0.3535533906, 0.3535533906], degree=3))
        make_face()
        with BuildLine():
            Line((-45, 67.5), (-30, 60))
            Line((-30, 60), (-30, 71.7917303212))
            add(Edge.make_bspline(
                [(-30, 71.7917303212), (-35.8009431025, 71.7917303212), (-41.6018862051, 70.3611535475), (-45, 67.5)],
                knots=[0.3535533906, 0.3535533906, 0.3535533906, 0.3535533906, 0.5, 0.5, 0.5, 0.5], degree=3))
        make_face()
        with BuildLine():
            Line((-48.6042439614, 60), (-30, 60))
            Line((-30, 60), (-45, 67.5))
            add(Edge.make_bspline(
                [(-45, 67.5), (-47.4028293076, 65.4768589246), (-48.6042439614, 62.7384294623), (-48.6042439614, 60)],
                knots=[0.5, 0.5, 0.5, 0.5, 0.6035533906, 0.6035533906, 0.6035533906, 0.6035533906], degree=3))
        make_face()
        with BuildLine():
            Line((-45, 52.5), (-30, 60))
            Line((-30, 60), (-48.6042439614, 60))
            add(Edge.make_bspline(
                [(-48.6042439614, 60), (-48.6042439614, 57.2615705377), (-47.4028293076, 54.5231410754), (-45, 52.5)],
                knots=[0.6035533906, 0.6035533906, 0.6035533906, 0.6035533906, 0.7071067812, 0.7071067812, 0.7071067812, 0.7071067812], degree=3))
        make_face()
        with BuildLine():
            add(Edge.make_bspline(
                [(-45, 52.5), (-41.6018862051, 49.6388464525), (-35.8009431025, 48.2082696788), (-30, 48.2082696788)],
                knots=[0.7071067812, 0.7071067812, 0.7071067812, 0.7071067812, 0.8535533906, 0.8535533906, 0.8535533906, 0.8535533906], degree=3))
            Line((-30, 48.2082696788), (-30, 60))
            Line((-30, 60), (-45, 52.5))
        make_face()
        with BuildLine():
            add(Edge.make_bspline(
                [(-30, 48.2082696788), (-24.1990568975, 48.2082696788), (-18.3981137949, 49.6388464525), (-15, 52.5)],
                knots=[0.8535533906, 0.8535533906, 0.8535533906, 0.8535533906, 1, 1, 1, 1], degree=3))
            Line((-15, 52.5), (-30, 60))
            Line((-30, 60), (-30, 48.2082696788))
        make_face()
        with BuildLine():
            Line((-30, 60), (-15, 52.5))
            add(Edge.make_bspline(
                [(-15, 52.5), (-12.5971706924, 54.5231410754), (-11.3957560386, 57.2615705377), (-11.3957560386, 60)],
                knots=[0, 0, 0, 0, 0.1035533906, 0.1035533906, 0.1035533906, 0.1035533906], degree=3))
            Line((-11.3957560386, 60), (-30, 60))
        make_face()
        with BuildLine():
            Line((-30, 60), (-11.3957560386, 60))
            add(Edge.make_bspline(
                [(-11.3957560386, 60), (-11.3957560386, 62.7384294623), (-12.5971706924, 65.4768589246), (-15, 67.5)],
                knots=[0.1035533906, 0.1035533906, 0.1035533906, 0.1035533906, 0.2071067812, 0.2071067812, 0.2071067812, 0.2071067812], degree=3))
            Line((-15, 67.5), (-30, 60))
        make_face()
        with BuildLine():
            add(Edge.make_bspline(
                [(-15, 37.5), (-16.0624446894, 43.5010559084), (-23.0312223447, 45), (-30, 45)],
                knots=[0.5594370973, 0.5594370973, 0.5594370973, 0.5594370973, 0.7797185487, 0.7797185487, 0.7797185487, 0.7797185487], degree=3))
            Line((-30, 45), (-30, 30))
            Line((-30, 30), (-15, 37.5))
        make_face()
        with BuildLine():
            Line((-30, 30), (-30, 45))
            add(Edge.make_bspline(
                [(-30, 45), (-36.9687776553, 45), (-43.9375553106, 43.5010559084), (-45, 37.5)],
                knots=[0.7797185487, 0.7797185487, 0.7797185487, 0.7797185487, 1, 1, 1, 1], degree=3))
            Line((-45, 37.5), (-30, 30))
        make_face()
        with BuildLine():
            Line((-44.1418695118, 30), (-30, 30))
            Line((-30, 30), (-45, 37.5))
            add(Edge.make_bspline(
                [(-45, 37.5), (-45.3722155878, 35.3975973295), (-45.0195040015, 32.7426177529), (-44.1418695118, 30)],
                knots=[0, 0, 0, 0, 0.0771731373, 0.0771731373, 0.0771731373, 0.0771731373], degree=3))
        make_face()
        with BuildLine():
            add(Edge.make_bspline(
                [(-44.1418695118, 30), (-41.838466476, 22.8018393394), (-35.919233238, 15), (-30, 15)],
                knots=[0.0771731373, 0.0771731373, 0.0771731373, 0.0771731373, 0.2797185487, 0.2797185487, 0.2797185487, 0.2797185487], degree=3))
            Line((-30, 15), (-30, 30))
            Line((-30, 30), (-44.1418695118, 30))
        make_face()
        with BuildLine():
            add(Edge.make_bspline(
                [(-30, 15), (-24.080766762, 15), (-18.161533524, 22.8018393394), (-15.8581304882, 30)],
                knots=[0.2797185487, 0.2797185487, 0.2797185487, 0.2797185487, 0.48226396, 0.48226396, 0.48226396, 0.48226396], degree=3))
            Line((-15.8581304882, 30), (-30, 30))
            Line((-30, 30), (-30, 15))
        make_face()
        with BuildLine():
            Line((-30, 30), (-15.8581304882, 30))
            add(Edge.make_bspline(
                [(-15.8581304882, 30), (-14.9804959985, 32.7426177529), (-14.6277844122, 35.3975973295), (-15, 37.5)],
                knots=[0.48226396, 0.48226396, 0.48226396, 0.48226396, 0.5594370973, 0.5594370973, 0.5594370973, 0.5594370973], degree=3))
            Line((-15, 37.5), (-30, 30))
        make_face()
    extrude(amount=-F12_DEPTH, mode=Mode.SUBTRACT)


solid = f1.part
